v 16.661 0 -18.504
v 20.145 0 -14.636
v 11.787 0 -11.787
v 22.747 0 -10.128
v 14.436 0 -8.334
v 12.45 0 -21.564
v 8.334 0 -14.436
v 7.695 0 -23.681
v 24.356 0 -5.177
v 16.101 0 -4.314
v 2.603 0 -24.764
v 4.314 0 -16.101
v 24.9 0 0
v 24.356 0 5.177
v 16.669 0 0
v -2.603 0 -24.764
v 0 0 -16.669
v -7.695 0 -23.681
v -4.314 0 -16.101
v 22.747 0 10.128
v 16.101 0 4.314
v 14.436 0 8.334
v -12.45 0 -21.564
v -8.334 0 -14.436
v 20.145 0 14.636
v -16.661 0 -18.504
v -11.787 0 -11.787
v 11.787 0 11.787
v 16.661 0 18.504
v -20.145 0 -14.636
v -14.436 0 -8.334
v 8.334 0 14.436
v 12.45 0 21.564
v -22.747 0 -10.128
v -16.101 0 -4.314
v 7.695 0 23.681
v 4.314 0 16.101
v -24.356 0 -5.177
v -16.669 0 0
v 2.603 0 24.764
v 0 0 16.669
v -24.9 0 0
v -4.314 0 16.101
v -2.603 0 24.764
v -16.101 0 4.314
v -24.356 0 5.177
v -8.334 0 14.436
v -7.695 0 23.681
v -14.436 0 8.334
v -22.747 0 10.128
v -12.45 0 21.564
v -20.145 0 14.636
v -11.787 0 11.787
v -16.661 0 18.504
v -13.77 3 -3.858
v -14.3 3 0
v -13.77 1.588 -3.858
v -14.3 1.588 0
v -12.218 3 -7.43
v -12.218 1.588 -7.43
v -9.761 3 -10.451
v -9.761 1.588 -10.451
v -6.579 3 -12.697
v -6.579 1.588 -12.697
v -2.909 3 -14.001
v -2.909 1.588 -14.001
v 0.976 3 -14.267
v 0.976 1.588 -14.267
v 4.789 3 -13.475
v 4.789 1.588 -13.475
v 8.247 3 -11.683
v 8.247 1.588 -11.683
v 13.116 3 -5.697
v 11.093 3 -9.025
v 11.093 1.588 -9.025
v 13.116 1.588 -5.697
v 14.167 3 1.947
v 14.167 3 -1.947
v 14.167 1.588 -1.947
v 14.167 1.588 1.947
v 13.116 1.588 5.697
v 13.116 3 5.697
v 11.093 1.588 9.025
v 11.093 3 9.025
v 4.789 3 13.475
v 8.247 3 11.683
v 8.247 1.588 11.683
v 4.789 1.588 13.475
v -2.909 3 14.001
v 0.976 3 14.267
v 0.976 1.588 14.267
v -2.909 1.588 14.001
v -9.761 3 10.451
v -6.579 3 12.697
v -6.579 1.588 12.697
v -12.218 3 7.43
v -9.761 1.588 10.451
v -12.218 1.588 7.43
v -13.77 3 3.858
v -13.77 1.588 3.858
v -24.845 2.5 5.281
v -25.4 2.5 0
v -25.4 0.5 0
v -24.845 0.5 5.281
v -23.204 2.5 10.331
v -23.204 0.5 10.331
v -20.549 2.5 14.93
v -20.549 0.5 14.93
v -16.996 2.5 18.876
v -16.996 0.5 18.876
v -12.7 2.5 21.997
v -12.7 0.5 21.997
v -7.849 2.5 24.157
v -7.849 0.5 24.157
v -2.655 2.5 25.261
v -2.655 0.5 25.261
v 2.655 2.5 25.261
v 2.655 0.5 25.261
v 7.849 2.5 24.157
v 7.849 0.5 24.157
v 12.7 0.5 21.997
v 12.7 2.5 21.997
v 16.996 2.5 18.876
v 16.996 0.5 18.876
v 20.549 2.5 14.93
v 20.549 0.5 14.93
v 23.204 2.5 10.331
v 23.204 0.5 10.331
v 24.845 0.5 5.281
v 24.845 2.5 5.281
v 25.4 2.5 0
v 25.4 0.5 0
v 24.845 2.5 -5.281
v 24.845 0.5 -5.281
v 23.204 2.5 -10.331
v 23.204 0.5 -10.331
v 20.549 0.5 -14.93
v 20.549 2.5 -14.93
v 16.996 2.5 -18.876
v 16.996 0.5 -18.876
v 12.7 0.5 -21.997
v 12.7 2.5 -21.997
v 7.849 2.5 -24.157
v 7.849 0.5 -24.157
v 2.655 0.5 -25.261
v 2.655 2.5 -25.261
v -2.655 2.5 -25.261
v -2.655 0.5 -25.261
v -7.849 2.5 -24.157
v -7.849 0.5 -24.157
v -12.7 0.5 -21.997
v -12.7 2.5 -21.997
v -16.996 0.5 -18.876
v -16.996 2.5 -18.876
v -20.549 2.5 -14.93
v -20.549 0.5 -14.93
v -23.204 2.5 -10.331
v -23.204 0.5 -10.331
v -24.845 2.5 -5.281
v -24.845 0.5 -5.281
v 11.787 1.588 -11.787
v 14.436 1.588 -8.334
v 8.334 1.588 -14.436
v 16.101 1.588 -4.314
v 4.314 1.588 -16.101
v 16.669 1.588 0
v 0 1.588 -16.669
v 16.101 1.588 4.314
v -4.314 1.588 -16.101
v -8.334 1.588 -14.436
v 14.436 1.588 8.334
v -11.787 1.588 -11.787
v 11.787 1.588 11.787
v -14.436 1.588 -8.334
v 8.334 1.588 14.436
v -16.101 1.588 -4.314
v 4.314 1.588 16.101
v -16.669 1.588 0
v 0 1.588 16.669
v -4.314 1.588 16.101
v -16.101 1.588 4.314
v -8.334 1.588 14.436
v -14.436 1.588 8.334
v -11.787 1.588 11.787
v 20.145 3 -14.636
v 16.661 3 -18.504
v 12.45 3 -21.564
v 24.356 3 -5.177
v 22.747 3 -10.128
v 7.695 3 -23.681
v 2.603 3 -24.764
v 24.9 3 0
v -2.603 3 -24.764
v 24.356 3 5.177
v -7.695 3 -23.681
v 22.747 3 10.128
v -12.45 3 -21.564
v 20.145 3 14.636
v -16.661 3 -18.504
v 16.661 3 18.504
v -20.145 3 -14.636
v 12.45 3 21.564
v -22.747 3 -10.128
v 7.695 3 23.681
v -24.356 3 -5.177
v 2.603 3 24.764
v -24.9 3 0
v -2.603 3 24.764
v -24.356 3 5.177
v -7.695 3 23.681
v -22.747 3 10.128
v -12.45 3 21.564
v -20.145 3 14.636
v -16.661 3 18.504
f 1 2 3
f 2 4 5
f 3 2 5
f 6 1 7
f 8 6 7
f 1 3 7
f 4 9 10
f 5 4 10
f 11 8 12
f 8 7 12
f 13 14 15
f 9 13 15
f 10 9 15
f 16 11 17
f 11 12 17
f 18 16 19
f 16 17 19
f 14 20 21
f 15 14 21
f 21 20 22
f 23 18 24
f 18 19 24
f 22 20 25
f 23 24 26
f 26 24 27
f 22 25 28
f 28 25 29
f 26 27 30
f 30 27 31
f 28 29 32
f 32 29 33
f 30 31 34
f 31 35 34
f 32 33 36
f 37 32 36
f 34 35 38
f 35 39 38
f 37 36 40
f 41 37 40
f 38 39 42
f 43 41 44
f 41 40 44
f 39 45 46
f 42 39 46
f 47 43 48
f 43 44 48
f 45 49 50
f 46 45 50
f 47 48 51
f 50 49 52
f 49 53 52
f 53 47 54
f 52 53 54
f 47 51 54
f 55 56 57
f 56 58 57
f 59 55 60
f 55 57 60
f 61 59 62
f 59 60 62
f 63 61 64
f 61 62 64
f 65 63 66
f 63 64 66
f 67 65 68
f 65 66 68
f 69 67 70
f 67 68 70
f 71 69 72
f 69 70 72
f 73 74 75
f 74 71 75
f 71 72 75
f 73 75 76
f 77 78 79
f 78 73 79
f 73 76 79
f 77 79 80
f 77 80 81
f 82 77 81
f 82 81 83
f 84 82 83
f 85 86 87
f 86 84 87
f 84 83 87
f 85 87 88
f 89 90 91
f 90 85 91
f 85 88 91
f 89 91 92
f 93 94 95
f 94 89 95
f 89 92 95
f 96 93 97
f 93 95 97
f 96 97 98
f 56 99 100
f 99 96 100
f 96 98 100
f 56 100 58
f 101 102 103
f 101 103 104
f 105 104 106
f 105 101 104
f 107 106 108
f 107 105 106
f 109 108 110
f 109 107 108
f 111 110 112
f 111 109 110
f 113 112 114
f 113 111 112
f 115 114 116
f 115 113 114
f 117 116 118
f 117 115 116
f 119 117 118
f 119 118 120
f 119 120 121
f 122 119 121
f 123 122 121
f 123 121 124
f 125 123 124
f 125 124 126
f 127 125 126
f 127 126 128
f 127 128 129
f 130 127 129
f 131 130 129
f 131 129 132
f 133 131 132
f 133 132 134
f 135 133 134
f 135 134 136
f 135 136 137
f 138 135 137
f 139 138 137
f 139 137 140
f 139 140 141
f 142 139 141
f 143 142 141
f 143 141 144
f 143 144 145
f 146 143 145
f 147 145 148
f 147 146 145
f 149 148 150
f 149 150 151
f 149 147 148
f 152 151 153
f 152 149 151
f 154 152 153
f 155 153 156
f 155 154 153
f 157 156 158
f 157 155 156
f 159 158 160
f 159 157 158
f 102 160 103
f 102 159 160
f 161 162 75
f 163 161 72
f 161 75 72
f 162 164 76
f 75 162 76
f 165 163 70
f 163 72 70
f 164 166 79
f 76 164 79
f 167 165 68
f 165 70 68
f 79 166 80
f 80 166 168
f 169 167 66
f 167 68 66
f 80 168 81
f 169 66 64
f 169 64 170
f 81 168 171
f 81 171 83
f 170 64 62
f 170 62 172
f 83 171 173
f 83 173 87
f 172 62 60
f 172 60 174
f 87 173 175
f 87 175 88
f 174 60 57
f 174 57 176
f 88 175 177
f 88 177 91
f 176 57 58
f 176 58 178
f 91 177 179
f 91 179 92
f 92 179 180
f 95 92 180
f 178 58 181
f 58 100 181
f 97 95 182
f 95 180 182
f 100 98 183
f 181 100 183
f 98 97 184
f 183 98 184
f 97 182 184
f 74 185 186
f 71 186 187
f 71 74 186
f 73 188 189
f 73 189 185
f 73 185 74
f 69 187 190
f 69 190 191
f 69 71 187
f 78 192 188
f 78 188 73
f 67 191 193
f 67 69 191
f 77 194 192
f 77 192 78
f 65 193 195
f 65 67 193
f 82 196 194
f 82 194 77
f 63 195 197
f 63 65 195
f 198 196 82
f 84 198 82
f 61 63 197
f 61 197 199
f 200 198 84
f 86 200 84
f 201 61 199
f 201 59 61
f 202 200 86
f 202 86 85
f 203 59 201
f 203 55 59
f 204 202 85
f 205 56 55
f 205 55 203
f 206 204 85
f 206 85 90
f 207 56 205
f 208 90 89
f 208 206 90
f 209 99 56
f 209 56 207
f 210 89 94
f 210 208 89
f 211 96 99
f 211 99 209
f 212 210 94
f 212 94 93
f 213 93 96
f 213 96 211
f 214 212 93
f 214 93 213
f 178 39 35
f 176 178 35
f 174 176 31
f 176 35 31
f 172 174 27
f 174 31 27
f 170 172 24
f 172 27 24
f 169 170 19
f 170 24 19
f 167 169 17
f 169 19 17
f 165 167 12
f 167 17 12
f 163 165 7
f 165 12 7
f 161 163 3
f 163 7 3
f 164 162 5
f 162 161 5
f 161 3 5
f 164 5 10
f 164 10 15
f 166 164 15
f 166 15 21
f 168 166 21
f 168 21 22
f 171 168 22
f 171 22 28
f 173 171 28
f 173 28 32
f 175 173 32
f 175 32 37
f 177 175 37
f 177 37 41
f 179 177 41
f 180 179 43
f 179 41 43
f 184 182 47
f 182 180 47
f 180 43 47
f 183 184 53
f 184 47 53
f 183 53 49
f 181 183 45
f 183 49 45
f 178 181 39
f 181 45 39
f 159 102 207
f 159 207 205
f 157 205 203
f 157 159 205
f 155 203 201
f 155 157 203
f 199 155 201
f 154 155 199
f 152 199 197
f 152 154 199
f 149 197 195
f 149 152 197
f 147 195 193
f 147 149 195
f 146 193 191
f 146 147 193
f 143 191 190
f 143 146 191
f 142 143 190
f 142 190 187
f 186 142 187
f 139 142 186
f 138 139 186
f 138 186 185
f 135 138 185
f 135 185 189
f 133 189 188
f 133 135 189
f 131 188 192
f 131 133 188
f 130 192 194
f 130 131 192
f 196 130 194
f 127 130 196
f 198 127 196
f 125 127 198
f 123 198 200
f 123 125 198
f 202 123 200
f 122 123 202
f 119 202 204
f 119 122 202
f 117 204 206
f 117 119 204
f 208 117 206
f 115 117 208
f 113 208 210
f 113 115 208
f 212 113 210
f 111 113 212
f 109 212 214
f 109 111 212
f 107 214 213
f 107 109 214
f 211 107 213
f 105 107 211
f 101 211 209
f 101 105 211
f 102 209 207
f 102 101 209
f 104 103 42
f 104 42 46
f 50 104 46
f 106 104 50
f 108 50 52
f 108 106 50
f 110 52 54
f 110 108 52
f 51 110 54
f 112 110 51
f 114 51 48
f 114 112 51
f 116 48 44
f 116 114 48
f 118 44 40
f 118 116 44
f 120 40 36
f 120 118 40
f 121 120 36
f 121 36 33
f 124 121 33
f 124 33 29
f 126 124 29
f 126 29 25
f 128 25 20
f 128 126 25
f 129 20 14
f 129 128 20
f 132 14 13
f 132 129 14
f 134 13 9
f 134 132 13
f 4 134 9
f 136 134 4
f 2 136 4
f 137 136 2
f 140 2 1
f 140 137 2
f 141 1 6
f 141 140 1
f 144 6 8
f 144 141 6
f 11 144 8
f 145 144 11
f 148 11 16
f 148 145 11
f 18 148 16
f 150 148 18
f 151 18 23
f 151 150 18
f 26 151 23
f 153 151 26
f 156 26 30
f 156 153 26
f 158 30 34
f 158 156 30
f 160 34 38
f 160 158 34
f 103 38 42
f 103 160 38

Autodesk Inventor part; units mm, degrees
ref_plane "YZ Plane" through (0, 0, 0) normal (1, 0, 0) x (0, 1, 0)
ref_plane "XZ Plane" through (0, 0, 0) normal (0, 1, 0) x (-1, 0, 0)
ref_plane "XY Plane" through (0, 0, 0) normal (0, 0, 1) x (1, 0, 0)
sketch "Sketch1" plane through (0, 0, 0) normal (0, 0, 1) x (1, 0, 0)
  line L0 (-24.9, 0) -> (-25.4, 0.5)
  line L1 (-16.6687, 0) -> (-24.9, 0)
  line L2 (-16.6687, 1.5875) -> (-16.6687, 0)
  line L3 (-14.3002, 1.5875) -> (-16.6687, 1.5875)
  line L4 (-14.3002, 3) -> (-14.3002, 1.5875)
  line L5 (-24.9, 3) -> (-14.3002, 3)
  line L6 (-25.4, 2.5) -> (-24.9, 3)
  line L7 (-25.4, 0.5) -> (-25.4, 2.5)
  line L8 (0, 0) -> (0, 6.8981)
  dimension "d0" = 50.8
  dimension "d1" = 28.6004
  dimension "d2" = 3
  dimension "d3" = 1.5875
  dimension "d4" = 2.3685
  dimension "d5" = 0.5
  dimension "d6" = 0.5
  dimension "d7" = 0.5
  dimension "d9" = 0.5
revolve "Revolution1" add sketch "Sketch1" angle 360 about axis through (0, 0, 0) along (0, 1, 0)
equation "\"d6\" = d5"
equation "\"d7\" = d6"
equation "\"d9\" = d7"
properties part number "VersaRoller Flange (WCP-0444)" material "Aluminum 6061"
